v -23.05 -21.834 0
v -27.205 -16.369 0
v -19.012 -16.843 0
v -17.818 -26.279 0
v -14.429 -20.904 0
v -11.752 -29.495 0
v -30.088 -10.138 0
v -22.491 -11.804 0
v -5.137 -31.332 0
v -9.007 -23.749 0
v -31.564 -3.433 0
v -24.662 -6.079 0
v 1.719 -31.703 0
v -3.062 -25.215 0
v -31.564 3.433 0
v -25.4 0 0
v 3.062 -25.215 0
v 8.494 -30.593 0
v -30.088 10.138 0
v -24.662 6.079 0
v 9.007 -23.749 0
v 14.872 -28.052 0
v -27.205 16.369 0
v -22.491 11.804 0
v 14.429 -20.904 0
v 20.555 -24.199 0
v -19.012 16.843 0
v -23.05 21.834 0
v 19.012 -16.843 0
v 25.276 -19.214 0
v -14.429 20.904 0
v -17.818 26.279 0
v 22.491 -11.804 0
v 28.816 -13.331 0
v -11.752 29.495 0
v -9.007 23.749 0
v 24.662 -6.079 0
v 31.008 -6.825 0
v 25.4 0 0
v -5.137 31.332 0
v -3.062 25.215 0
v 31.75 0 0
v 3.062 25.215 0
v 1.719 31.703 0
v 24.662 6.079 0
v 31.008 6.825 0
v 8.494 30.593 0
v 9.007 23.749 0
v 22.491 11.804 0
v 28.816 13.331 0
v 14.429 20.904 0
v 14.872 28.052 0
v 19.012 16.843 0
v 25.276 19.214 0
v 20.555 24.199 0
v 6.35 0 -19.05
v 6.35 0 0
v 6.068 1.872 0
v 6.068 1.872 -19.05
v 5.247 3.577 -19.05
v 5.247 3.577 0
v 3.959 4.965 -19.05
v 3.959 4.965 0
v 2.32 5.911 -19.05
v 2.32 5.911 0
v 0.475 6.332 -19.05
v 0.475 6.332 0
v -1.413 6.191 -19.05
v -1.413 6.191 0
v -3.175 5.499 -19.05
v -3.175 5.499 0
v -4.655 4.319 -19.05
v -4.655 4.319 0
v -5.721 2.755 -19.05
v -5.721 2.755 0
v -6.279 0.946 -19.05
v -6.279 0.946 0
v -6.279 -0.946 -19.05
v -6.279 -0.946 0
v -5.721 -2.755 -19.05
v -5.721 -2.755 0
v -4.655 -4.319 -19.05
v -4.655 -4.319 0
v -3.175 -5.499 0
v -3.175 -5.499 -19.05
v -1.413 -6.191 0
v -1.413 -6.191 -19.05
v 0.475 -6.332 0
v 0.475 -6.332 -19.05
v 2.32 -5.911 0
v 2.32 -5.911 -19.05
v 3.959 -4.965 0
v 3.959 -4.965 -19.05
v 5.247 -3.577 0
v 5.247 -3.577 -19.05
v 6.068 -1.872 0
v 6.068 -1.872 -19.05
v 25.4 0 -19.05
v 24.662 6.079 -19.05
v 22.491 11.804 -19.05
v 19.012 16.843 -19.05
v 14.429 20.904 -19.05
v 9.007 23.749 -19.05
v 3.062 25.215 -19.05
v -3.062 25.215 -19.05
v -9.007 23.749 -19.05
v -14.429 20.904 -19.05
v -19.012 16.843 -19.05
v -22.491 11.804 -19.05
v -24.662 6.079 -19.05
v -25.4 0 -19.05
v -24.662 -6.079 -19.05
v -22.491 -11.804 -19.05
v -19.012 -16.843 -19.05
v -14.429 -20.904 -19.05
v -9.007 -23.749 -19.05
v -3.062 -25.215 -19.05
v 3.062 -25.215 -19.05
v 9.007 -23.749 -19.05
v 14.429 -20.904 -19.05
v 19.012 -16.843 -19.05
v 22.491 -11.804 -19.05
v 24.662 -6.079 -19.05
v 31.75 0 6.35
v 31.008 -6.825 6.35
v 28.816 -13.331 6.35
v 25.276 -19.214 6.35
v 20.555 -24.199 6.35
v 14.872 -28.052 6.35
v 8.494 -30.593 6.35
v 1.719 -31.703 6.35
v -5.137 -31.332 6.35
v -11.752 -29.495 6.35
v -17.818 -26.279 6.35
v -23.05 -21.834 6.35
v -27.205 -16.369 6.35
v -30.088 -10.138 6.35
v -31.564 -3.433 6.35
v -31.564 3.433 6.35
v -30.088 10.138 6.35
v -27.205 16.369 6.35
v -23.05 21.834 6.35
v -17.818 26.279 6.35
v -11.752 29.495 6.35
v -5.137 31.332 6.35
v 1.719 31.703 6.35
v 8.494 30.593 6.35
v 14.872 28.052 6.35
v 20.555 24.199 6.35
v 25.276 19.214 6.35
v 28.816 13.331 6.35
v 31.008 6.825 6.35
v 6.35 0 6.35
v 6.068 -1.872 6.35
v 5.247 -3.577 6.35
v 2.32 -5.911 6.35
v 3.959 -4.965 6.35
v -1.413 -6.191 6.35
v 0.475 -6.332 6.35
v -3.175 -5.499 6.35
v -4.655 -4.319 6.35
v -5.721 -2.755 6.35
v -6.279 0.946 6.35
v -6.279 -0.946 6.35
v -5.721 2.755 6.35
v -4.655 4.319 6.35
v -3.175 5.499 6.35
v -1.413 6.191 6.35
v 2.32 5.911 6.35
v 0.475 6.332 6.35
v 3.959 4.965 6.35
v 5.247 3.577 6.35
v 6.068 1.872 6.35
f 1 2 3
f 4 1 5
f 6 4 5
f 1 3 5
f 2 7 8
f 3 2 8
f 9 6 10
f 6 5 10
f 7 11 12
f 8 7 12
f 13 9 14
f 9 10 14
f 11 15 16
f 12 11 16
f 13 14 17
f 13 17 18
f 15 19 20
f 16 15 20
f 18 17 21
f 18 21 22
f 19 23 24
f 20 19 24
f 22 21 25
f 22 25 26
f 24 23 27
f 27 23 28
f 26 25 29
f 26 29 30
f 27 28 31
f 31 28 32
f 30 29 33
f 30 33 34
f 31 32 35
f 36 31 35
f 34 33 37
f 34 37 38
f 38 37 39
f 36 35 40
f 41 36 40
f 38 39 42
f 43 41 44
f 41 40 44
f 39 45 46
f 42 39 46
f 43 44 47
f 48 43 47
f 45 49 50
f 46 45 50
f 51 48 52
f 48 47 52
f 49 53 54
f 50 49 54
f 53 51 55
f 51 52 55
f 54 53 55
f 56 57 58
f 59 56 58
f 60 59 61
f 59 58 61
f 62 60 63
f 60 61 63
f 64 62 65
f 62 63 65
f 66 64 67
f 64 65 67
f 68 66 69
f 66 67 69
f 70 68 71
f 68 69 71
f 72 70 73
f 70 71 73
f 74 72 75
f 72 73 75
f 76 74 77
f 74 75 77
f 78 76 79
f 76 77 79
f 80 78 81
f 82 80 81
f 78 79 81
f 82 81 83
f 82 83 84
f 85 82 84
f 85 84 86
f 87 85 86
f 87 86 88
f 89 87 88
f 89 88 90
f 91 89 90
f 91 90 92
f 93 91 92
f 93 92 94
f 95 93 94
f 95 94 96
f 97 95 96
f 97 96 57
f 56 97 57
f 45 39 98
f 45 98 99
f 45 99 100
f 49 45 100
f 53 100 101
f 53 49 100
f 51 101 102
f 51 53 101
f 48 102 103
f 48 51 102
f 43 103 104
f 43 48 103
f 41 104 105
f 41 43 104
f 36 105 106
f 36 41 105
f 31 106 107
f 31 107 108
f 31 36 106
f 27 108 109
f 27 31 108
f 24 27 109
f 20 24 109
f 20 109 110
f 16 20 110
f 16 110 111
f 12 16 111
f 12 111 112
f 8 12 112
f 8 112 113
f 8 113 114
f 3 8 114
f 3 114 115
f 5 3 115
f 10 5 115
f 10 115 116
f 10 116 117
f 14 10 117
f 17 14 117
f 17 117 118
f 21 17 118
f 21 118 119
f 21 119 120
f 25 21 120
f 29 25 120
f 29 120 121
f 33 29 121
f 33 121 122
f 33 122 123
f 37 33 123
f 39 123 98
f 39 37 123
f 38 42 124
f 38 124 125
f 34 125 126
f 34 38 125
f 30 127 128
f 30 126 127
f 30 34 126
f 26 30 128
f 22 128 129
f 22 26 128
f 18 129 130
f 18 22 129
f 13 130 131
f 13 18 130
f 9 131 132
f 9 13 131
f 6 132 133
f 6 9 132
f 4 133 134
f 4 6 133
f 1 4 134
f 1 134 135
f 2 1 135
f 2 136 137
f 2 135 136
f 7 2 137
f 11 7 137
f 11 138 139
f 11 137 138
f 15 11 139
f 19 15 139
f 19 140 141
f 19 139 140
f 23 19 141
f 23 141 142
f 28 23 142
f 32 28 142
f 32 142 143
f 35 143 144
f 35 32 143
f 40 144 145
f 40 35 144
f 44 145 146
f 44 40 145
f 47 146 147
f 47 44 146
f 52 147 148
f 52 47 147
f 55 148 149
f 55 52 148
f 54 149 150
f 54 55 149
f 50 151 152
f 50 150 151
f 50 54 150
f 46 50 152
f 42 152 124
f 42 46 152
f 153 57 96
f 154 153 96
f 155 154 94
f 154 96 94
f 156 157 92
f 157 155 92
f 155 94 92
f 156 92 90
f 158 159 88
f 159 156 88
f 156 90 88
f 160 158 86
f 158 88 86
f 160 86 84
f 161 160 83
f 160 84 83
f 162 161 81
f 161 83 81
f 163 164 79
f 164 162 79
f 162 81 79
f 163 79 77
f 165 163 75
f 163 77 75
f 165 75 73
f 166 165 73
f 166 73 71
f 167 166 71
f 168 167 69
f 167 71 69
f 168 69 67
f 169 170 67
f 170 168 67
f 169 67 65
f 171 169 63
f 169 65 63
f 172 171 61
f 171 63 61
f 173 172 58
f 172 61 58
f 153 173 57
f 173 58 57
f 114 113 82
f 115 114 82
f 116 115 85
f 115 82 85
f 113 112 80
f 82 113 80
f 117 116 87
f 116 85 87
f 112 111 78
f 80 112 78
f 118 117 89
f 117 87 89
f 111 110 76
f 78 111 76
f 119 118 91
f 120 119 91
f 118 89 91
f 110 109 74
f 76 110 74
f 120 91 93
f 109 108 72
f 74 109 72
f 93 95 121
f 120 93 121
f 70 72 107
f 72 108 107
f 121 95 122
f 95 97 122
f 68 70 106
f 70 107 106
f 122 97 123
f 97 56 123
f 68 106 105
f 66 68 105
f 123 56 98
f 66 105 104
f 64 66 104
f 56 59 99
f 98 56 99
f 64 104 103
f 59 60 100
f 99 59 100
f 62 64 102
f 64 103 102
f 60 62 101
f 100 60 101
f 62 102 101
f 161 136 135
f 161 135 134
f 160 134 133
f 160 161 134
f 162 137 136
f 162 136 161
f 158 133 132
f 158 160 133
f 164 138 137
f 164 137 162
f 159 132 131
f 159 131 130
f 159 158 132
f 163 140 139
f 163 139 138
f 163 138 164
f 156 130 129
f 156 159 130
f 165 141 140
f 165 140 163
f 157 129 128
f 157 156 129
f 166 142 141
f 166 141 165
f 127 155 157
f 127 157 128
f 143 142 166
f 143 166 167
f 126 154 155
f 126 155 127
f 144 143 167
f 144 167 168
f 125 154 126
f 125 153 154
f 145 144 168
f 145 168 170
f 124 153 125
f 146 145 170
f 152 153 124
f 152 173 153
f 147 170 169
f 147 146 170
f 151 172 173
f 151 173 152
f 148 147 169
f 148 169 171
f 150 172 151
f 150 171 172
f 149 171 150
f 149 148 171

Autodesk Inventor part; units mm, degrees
ref_plane "YZ Plane" through (0, 0, 0) normal (1, 0, 0) x (0, 1, 0)
ref_plane "XZ Plane" through (0, 0, 0) normal (0, 1, 0) x (-1, 0, 0)
ref_plane "XY Plane" through (0, 0, 0) normal (0, 0, 1) x (1, 0, 0)
sketch "Sketch1" plane through (0, 0, 0) normal (0, 0, 1) x (1, 0, 0)
  circle A0 centre (0, 0) radius 31.75
  circle A1 centre (0, 0) radius 25.4
  circle A2 centre (0, 0) radius 6.35
  dimension "d0" = 63.5
  dimension "d1" = 50.8
  dimension "d2" = 12.7
extrude "Extrusion1" add sketch "Sketch1" along normal blind 6.35 contours A0
extrude "Extrusion2" add sketch "Sketch1" along normal blind 6.35 contours A1
extrude "Extrusion3" add sketch "Sketch1" against normal blind 19.05 contours A1
properties part number "2.5ingear proxy"
